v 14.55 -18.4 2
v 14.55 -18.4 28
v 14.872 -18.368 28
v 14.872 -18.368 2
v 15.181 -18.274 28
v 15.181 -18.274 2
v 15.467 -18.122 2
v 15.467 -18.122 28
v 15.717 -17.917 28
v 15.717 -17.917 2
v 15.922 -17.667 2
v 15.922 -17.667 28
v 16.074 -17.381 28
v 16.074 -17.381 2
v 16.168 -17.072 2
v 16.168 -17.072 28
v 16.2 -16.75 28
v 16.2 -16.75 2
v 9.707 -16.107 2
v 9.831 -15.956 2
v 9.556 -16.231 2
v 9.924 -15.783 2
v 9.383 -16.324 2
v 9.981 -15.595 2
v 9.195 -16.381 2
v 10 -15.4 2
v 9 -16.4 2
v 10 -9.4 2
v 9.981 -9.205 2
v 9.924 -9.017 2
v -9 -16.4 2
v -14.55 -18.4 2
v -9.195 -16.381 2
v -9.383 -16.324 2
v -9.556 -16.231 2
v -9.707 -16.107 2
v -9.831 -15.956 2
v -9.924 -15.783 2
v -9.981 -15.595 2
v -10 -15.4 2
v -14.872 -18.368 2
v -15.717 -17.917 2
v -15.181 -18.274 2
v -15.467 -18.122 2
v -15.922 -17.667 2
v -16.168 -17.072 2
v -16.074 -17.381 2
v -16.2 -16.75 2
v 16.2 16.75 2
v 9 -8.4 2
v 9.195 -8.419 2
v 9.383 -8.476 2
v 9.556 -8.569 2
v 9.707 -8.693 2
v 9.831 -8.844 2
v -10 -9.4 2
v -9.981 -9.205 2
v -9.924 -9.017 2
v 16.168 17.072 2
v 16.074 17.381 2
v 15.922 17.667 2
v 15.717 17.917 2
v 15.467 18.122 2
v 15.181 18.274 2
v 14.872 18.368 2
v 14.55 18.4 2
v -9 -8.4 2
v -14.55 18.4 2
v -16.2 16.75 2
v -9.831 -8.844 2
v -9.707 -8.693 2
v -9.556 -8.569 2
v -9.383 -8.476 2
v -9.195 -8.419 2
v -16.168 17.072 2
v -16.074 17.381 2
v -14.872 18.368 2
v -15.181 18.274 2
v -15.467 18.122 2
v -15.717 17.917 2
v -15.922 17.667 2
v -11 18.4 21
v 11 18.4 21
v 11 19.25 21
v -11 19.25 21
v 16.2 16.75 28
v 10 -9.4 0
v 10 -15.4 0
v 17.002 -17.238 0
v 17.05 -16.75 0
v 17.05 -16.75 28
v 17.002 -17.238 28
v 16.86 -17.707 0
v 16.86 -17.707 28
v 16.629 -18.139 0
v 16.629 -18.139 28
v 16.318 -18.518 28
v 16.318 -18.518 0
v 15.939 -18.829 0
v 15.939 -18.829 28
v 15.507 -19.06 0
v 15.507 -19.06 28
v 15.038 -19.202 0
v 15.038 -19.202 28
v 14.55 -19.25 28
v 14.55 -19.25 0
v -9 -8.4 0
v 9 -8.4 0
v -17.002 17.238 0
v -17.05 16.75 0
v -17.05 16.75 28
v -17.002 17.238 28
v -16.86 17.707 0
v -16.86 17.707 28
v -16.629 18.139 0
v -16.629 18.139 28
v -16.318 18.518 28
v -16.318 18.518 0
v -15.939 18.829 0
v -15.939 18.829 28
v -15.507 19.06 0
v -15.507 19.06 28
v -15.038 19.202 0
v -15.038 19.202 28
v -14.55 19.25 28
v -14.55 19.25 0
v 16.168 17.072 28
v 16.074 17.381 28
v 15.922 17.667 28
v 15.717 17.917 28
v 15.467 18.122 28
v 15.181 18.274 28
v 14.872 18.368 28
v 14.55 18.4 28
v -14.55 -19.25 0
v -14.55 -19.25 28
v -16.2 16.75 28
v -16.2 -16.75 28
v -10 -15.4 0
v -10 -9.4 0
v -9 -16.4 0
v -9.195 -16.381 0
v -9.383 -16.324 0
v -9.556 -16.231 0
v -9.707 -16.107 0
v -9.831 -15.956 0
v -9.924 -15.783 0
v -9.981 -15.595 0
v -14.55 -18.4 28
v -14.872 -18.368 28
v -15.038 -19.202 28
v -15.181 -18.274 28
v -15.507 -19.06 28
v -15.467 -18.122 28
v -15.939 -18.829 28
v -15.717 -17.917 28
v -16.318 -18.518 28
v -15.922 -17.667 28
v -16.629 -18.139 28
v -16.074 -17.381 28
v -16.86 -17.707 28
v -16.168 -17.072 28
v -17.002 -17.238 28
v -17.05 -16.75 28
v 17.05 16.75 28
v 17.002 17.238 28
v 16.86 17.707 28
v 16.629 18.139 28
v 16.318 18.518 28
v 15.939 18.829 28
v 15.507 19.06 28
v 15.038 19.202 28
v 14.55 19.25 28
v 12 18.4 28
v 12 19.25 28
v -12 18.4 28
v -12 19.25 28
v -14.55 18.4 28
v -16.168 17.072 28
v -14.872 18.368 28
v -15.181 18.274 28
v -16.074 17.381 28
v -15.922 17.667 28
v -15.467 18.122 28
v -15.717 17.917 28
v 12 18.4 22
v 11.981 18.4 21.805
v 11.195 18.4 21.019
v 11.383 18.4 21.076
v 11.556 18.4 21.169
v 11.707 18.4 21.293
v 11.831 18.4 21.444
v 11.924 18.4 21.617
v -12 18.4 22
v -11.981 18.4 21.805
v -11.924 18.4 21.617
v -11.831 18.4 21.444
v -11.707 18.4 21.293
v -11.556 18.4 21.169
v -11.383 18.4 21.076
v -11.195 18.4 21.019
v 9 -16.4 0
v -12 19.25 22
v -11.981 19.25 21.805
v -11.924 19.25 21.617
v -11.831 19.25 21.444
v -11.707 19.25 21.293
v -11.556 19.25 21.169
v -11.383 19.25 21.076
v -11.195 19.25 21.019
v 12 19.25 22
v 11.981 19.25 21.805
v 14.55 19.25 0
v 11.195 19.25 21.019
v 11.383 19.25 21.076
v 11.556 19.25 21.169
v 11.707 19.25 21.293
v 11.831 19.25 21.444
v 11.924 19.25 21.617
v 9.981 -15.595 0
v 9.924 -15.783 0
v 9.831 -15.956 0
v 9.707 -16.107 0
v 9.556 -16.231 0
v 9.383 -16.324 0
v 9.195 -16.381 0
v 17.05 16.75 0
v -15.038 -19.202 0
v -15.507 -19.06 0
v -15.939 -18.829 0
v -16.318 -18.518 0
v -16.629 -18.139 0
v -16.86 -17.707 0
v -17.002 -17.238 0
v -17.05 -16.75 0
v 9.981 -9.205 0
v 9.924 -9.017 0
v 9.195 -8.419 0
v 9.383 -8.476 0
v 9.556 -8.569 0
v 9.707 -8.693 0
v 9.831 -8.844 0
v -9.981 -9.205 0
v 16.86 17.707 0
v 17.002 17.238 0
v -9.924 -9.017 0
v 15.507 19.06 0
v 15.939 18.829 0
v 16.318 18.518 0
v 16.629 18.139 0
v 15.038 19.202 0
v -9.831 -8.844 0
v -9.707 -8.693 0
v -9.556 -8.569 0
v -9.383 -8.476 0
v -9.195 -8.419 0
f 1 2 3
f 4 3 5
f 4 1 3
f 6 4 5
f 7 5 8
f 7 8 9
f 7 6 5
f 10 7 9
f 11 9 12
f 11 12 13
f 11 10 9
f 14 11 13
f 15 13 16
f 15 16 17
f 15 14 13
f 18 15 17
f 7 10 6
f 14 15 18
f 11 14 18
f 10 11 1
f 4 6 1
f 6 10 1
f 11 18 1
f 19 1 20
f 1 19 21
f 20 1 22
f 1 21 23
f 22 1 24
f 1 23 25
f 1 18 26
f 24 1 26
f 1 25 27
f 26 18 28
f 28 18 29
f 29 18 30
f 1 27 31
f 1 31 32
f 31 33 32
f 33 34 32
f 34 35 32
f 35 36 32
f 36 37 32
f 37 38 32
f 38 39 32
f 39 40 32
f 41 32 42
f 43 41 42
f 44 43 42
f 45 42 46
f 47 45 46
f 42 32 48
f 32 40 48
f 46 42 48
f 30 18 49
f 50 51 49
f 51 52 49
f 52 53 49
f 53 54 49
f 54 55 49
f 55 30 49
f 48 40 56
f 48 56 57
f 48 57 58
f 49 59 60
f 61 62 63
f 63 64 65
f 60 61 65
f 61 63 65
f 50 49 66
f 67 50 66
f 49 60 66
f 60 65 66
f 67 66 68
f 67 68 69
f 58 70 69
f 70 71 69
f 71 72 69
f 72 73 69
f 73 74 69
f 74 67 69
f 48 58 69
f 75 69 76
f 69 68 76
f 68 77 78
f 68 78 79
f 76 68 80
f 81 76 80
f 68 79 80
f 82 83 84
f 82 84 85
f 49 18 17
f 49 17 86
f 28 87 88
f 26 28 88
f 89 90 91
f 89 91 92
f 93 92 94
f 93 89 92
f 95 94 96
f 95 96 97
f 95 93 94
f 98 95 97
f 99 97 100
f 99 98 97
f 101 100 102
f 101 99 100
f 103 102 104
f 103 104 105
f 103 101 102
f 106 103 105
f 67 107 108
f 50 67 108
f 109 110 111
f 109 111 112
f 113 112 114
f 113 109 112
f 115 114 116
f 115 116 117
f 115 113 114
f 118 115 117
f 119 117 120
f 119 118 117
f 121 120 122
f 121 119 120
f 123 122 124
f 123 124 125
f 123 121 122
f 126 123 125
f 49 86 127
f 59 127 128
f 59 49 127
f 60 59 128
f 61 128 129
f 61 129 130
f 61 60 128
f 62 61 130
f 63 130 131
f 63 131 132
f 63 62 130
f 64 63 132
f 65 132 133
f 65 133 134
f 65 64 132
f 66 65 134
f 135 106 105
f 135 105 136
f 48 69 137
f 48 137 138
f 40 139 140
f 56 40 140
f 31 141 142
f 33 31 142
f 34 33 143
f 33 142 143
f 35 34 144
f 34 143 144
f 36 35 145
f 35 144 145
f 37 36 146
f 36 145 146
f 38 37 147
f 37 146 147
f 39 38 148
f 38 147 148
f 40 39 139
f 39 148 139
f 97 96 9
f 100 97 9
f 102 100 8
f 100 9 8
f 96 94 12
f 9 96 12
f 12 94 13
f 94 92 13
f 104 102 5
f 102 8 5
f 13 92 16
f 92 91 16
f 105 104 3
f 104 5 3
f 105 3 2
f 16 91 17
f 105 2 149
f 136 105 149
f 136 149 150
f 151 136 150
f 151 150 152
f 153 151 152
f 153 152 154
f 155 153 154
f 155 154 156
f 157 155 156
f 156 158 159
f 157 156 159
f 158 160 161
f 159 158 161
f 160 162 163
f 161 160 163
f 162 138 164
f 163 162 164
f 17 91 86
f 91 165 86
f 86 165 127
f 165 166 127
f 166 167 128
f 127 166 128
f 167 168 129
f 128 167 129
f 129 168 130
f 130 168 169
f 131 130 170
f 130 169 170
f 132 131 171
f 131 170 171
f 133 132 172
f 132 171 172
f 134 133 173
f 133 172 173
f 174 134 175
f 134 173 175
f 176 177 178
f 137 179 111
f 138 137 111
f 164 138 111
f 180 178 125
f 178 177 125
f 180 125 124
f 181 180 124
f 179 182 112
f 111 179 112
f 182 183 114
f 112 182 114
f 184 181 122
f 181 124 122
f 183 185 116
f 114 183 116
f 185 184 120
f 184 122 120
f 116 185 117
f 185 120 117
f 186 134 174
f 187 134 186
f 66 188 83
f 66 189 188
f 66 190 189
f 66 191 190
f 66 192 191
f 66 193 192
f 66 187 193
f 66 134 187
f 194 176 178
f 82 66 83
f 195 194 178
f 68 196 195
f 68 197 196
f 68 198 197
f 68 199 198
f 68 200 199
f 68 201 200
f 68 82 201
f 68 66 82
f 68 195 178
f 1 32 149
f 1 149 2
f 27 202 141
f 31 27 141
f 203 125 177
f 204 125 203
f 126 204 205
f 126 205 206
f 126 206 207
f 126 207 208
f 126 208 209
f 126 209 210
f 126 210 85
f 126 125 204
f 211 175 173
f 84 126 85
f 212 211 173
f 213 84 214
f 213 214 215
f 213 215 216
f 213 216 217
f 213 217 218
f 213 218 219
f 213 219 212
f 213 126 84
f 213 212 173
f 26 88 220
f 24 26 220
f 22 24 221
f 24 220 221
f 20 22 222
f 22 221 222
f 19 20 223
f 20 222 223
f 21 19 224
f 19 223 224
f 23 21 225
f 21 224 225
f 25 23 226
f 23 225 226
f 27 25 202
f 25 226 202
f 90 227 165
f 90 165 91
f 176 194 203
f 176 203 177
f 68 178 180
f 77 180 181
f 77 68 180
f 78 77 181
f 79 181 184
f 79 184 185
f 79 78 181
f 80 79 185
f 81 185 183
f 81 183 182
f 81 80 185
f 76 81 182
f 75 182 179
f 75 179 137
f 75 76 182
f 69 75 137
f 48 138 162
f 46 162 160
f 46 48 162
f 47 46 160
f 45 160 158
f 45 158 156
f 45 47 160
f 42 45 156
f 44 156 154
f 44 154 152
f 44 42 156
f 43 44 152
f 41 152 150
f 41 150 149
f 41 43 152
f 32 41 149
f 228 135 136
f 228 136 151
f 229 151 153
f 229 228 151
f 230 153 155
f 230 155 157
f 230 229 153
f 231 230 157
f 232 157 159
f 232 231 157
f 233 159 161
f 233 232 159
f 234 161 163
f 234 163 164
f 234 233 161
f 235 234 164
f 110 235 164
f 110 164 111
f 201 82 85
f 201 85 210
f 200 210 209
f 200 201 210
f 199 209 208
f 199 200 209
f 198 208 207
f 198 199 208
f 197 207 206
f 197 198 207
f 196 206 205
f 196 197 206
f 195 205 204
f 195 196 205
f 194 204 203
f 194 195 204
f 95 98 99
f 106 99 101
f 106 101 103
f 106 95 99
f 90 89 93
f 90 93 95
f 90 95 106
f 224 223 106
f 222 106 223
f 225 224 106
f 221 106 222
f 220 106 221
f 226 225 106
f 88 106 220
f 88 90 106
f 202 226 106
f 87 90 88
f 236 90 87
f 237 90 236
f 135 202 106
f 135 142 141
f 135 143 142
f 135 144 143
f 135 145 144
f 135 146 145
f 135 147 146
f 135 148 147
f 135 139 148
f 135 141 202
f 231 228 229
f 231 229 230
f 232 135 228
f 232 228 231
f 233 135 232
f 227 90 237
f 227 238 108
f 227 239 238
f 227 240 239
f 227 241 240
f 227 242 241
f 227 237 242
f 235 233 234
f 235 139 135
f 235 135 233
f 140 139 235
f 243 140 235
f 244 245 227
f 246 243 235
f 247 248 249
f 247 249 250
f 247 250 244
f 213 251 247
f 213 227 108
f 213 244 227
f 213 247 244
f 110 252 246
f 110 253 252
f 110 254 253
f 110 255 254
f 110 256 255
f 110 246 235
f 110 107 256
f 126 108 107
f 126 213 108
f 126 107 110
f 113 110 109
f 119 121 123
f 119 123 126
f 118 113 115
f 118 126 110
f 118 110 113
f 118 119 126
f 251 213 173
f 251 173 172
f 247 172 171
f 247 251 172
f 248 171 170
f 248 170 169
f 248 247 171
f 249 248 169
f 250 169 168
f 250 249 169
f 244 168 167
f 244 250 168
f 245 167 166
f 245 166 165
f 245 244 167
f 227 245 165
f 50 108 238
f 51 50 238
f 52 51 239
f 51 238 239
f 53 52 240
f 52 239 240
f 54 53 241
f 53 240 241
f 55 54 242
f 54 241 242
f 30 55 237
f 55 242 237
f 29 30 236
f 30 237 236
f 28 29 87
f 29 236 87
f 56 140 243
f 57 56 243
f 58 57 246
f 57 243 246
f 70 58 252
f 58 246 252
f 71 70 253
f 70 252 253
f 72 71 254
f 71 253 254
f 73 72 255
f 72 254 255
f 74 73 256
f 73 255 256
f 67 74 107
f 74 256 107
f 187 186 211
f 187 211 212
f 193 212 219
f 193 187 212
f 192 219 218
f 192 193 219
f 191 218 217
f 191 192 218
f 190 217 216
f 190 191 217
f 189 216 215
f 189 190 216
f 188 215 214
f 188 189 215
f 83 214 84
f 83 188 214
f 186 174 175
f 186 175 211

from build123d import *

# Parameters (mm, degrees)
BOSS_EXTRUDE1_DEPTH = 28
BOSS_EXTRUDE2_DEPTH = 2
CUT_EXTRUDE1_DEPTH  = 39.016641093


with BuildPart() as part:
    # Sketch1 → Boss-Extrude1 (new body)
    with BuildSketch(Plane.XY):
        with BuildLine():
            ThreePointArc((-17.05, -16.75), (-16.317766953, -18.517766953), (-14.55, -19.25))
            Line((-14.55, -19.25), (14.55, -19.25))
            ThreePointArc((14.55, -19.25), (16.317766953, -18.517766953), (17.05, -16.75))
            Line((17.05, -16.75), (17.05, 16.75))
            ThreePointArc((17.05, 16.75), (16.317766953, 18.517766953), (14.55, 19.25))
            Line((14.55, 19.25), (-14.55, 19.25))
            ThreePointArc((-14.55, 19.25), (-16.317766953, 18.517766953), (-17.05, 16.75))
            Line((-17.05, 16.75), (-17.05, -16.75))
        make_face()
        with BuildLine():
            ThreePointArc((-14.55, -18.4), (-15.716726189, -17.916726189), (-16.2, -16.75))
            Line((-16.2, -16.75), (-16.2, 16.75))
            ThreePointArc((-16.2, 16.75), (-15.716726189, 17.916726189), (-14.55, 18.4))
            Line((-14.55, 18.4), (14.55, 18.4))
            ThreePointArc((14.55, 18.4), (15.716726189, 17.916726189), (16.2, 16.75))
            Line((16.2, 16.75), (16.2, -16.75))
            ThreePointArc((16.2, -16.75), (15.716726189, -17.916726189), (14.55, -18.4))
            Line((14.55, -18.4), (-14.55, -18.4))
        make_face(mode=Mode.SUBTRACT)
    extrude(amount=BOSS_EXTRUDE1_DEPTH)

    # Sketch1<3> → Boss-Extrude2 (add)
    with BuildSketch(Plane.XY):
        with BuildLine():
            Line((-16.2, 16.75), (-16.2, -16.75))
            ThreePointArc((-16.2, -16.75), (-15.716726189, -17.916726189), (-14.55, -18.4))
            Line((-14.55, -18.4), (14.55, -18.4))
            ThreePointArc((14.55, -18.4), (15.716726189, -17.916726189), (16.2, -16.75))
            Line((16.2, -16.75), (16.2, 16.75))
            ThreePointArc((16.2, 16.75), (15.716726189, 17.916726189), (14.55, 18.4))
            Line((14.55, 18.4), (-14.55, 18.4))
            ThreePointArc((-14.55, 18.4), (-15.716726189, 17.916726189), (-16.2, 16.75))
        make_face()
        with BuildLine():
            Line((9, -16.4), (-9, -16.4))
            ThreePointArc((-9, -16.4), (-9.707106781, -16.107106781), (-10, -15.4))
            Line((-10, -15.4), (-10, -9.4))
            ThreePointArc((-10, -9.4), (-9.707106781, -8.692893219), (-9, -8.4))
            Line((-9, -8.4), (9, -8.4))
            ThreePointArc((9, -8.4), (9.707106781, -8.692893219), (10, -9.4))
            Line((10, -9.4), (10, -15.4))
            ThreePointArc((10, -15.4), (9.707106781, -16.107106781), (9, -16.4))
        make_face(mode=Mode.SUBTRACT)
    extrude(amount=BOSS_EXTRUDE2_DEPTH)

    # Sketch2 → Cut-Extrude1 (cut, through all)
    with BuildSketch(Plane(origin=(0, 0, 0), x_dir=(1, 0, 0), z_dir=(0, 1, 0))):
        with BuildLine():
            Line((-12, -28), (12, -28))
            Line((12, -28), (12, -22))
            ThreePointArc((12, -22), (11.707106781, -21.292893219), (11, -21))
            Line((11, -21), (-11, -21))
            ThreePointArc((-11, -21), (-11.707106781, -21.292893219), (-12, -22))
            Line((-12, -22), (-12, -28))
        make_face()
    extrude(amount=CUT_EXTRUDE1_DEPTH, mode=Mode.SUBTRACT)


solid = part.part
